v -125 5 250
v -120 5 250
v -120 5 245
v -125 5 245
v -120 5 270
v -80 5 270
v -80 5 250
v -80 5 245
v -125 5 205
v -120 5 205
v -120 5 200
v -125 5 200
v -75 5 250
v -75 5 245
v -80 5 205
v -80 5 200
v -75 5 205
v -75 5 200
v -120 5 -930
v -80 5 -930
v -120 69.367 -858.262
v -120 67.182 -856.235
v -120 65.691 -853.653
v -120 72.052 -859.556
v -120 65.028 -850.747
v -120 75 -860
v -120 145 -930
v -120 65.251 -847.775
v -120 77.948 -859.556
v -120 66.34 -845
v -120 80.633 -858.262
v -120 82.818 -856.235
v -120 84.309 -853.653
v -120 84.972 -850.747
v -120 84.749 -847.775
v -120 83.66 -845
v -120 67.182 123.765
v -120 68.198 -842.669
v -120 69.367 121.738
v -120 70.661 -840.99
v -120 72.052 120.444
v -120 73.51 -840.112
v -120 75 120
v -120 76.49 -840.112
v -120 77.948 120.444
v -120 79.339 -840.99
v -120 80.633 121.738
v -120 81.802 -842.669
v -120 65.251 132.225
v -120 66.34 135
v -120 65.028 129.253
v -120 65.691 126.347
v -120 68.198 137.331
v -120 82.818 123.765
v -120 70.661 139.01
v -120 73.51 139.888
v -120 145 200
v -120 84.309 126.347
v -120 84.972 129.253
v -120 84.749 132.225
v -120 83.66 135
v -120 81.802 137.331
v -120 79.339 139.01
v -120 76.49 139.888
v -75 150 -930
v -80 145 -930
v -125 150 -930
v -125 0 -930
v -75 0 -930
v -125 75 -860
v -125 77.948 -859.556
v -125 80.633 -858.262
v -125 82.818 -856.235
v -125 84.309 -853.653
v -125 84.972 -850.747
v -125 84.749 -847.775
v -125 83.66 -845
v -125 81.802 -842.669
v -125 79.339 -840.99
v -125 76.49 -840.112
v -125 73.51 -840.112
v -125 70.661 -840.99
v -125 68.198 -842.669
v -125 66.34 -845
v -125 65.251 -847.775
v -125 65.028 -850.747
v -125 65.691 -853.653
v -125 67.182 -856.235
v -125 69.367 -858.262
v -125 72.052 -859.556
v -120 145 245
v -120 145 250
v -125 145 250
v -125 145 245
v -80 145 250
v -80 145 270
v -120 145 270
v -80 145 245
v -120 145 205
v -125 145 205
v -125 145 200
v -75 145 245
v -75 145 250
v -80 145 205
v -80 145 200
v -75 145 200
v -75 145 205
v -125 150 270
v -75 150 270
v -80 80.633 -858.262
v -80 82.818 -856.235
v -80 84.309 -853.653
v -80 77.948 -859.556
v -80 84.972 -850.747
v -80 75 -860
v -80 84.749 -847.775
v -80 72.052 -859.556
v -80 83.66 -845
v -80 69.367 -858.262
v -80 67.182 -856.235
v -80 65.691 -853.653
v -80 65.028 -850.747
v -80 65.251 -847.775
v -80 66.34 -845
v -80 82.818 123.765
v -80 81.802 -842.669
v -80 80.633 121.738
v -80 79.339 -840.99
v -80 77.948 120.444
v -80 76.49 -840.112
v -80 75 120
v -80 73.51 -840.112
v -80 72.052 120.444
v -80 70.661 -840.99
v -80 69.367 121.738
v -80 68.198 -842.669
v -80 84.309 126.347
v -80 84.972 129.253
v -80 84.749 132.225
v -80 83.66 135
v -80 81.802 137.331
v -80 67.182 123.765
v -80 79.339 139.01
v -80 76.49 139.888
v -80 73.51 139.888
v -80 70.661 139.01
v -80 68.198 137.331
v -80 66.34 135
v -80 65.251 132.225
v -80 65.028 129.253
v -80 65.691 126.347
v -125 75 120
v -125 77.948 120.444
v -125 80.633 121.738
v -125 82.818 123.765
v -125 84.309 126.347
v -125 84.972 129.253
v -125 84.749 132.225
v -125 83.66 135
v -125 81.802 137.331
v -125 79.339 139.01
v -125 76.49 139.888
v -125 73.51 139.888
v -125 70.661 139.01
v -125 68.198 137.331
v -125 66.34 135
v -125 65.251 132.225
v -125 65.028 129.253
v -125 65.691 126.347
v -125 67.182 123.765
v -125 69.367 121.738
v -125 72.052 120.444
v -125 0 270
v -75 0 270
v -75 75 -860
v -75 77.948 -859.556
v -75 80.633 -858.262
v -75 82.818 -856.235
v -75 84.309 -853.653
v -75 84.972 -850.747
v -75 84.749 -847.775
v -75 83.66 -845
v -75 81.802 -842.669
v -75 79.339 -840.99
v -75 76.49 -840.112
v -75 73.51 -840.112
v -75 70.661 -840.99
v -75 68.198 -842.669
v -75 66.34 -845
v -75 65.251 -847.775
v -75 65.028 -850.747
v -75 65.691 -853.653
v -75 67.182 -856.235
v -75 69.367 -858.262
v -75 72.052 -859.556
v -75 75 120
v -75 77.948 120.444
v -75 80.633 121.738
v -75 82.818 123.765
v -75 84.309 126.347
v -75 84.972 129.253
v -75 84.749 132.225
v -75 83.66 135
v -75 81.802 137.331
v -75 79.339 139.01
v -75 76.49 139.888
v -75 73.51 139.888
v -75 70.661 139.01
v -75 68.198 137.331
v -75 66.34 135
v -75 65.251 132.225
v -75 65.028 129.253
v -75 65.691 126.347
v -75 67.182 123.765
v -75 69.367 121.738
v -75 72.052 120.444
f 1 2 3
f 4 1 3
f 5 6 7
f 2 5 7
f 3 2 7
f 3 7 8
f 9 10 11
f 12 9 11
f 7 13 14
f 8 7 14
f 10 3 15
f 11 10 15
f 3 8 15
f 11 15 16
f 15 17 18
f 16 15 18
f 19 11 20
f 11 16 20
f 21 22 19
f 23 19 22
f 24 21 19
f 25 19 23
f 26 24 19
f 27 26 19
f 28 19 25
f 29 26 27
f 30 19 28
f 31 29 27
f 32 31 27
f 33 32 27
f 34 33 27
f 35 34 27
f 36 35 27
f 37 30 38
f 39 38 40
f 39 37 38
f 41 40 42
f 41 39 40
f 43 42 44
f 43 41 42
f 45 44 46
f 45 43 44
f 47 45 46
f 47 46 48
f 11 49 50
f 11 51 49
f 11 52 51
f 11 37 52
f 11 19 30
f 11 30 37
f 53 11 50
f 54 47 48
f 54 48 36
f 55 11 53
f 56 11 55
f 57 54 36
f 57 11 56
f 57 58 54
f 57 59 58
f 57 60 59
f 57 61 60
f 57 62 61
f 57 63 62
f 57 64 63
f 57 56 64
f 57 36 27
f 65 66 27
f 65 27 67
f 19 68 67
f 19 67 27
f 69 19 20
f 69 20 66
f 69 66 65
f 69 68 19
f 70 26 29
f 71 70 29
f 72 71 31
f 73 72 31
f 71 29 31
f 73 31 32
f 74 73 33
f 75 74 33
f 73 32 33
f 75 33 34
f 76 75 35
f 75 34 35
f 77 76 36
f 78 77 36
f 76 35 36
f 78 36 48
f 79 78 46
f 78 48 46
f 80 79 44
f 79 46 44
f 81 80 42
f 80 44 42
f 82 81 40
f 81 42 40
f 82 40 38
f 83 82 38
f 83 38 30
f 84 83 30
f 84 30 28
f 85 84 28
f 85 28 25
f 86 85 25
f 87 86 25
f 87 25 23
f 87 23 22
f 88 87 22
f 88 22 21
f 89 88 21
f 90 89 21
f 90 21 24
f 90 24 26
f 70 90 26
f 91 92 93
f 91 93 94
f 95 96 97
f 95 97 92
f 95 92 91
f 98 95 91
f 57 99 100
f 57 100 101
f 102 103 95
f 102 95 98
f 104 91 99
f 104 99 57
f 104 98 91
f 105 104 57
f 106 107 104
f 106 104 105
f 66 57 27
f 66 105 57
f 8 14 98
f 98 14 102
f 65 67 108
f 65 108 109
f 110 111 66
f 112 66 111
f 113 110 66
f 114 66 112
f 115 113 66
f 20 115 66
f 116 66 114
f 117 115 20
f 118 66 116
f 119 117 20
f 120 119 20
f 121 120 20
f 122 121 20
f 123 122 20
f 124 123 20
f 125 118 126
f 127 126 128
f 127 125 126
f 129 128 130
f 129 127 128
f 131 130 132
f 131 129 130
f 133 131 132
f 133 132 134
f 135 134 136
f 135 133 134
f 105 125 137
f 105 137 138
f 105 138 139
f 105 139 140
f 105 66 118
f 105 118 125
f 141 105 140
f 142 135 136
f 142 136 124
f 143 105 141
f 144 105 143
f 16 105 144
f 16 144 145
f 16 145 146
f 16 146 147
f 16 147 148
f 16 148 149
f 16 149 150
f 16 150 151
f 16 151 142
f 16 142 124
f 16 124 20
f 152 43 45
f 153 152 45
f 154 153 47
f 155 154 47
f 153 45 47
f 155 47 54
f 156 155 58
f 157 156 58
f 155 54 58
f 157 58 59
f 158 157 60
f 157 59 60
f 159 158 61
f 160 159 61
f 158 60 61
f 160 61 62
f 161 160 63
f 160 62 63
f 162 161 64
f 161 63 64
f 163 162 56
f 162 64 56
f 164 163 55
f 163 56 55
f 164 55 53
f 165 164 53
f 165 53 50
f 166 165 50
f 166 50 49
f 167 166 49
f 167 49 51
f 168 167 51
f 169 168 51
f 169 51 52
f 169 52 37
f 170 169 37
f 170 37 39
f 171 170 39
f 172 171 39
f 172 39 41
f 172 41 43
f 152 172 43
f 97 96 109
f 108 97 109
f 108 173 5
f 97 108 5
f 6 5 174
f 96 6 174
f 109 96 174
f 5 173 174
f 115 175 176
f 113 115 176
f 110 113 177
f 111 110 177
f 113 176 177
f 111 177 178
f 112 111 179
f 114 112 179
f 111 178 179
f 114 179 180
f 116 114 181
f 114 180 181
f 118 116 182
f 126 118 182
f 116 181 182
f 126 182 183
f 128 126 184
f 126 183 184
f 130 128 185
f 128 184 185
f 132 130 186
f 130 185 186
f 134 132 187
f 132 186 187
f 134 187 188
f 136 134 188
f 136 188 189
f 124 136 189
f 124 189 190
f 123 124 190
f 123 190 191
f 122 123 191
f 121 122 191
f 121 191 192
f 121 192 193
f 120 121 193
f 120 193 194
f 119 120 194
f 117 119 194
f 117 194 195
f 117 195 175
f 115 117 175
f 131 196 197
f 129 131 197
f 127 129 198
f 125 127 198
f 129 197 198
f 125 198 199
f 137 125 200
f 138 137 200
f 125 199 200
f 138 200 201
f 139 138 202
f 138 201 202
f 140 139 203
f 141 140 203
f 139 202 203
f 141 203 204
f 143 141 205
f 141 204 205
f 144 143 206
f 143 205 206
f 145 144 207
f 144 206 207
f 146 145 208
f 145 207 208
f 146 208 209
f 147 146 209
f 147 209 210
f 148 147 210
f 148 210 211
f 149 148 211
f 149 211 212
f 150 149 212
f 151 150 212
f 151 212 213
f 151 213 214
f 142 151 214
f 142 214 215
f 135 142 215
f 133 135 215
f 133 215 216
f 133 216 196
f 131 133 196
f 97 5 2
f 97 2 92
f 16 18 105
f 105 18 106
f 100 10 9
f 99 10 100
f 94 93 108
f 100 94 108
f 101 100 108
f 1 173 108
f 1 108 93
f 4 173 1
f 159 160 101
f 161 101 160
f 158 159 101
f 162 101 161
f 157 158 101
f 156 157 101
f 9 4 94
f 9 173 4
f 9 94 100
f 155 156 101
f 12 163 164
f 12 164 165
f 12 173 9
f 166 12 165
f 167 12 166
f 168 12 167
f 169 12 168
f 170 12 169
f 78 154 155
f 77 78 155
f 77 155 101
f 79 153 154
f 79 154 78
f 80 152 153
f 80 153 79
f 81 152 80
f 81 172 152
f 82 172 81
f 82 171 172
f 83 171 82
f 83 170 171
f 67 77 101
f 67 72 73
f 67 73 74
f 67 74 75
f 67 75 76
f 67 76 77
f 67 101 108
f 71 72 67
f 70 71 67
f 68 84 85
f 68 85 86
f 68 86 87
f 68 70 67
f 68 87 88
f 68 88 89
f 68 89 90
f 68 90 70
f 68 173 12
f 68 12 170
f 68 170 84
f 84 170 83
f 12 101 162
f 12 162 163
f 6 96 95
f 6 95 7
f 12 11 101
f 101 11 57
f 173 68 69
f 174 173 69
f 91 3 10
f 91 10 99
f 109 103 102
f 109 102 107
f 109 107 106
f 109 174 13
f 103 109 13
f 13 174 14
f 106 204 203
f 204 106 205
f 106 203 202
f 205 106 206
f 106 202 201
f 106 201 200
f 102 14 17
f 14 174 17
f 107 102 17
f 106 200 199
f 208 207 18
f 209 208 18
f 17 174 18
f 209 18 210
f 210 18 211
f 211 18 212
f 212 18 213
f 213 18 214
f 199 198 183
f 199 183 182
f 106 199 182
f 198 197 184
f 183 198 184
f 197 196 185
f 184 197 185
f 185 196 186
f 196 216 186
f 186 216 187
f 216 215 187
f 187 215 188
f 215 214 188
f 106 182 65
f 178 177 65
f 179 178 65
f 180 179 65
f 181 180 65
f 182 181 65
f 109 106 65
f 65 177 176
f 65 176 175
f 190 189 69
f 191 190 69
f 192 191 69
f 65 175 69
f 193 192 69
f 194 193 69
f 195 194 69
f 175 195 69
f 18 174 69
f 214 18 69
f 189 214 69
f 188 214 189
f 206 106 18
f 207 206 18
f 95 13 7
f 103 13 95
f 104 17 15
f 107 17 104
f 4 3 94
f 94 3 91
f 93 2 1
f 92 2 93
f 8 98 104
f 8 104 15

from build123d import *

# Parameters (mm, degrees)
SKETCH1_W           = 50
SKETCH1_H           = 1200
BOSS_EXTRUDE1_DEPTH = 150
CUT_EXTRUDE4_DEPTH  = 1216.781641579
SKETCH18_W          = 5
SKETCH18_H          = 140
CUT_EXTRUDE6_DEPTH  = 944.345111823
SKETCH19_W          = 5
SKETCH19_H          = 140
CUT_EXTRUDE7_DEPTH  = 944.345111823
SKETCH20_R          = 10
CUT_EXTRUDE8_DEPTH  = 944.345111823


with BuildPart() as part:
    # Sketch1 → Boss-Extrude1 (new body)
    with BuildSketch(Plane(origin=(0, 0, 0), x_dir=(1, 0, 0), z_dir=(0, 1, 0))):
        with Locations((-100, 330)):
            Rectangle(SKETCH1_W, SKETCH1_H)
    extrude(amount=BOSS_EXTRUDE1_DEPTH)

    # Sketch16 → Cut-Extrude4 (cut, through all)
    with BuildSketch(Plane.XY.offset(270)):
        Polygon((-100, 5), (-120, 5), (-120, 145), (-80, 145), (-80, 5), align=None)
    extrude(amount=-CUT_EXTRUDE4_DEPTH, mode=Mode.SUBTRACT)

    # Sketch18 → Cut-Extrude6 (cut, through all)
    with BuildSketch(Plane(origin=(-75, 0, 0), x_dir=(0, 0, -1), z_dir=(1, 0, 0))):
        with Locations((-247.5, 75)):
            Rectangle(SKETCH18_W, SKETCH18_H)
    extrude(amount=-CUT_EXTRUDE6_DEPTH, mode=Mode.SUBTRACT)

    # Sketch19 → Cut-Extrude7 (cut, through all)
    with BuildSketch(Plane(origin=(-75, 0, 0), x_dir=(0, 0, -1), z_dir=(1, 0, 0))):
        with Locations((-202.5, 75)):
            Rectangle(SKETCH19_W, SKETCH19_H)
    extrude(amount=-CUT_EXTRUDE7_DEPTH, mode=Mode.SUBTRACT)

    # Sketch20 → Cut-Extrude8 (cut, through all)
    with BuildSketch(Plane(origin=(-75, 0, 0), x_dir=(0, 0, -1), z_dir=(1, 0, 0))):
        with Locations((-130, 75)):
            Circle(SKETCH20_R)
        with Locations((850, 75)):
            Circle(SKETCH20_R)
    extrude(amount=-CUT_EXTRUDE8_DEPTH, mode=Mode.SUBTRACT)


solid = part.part
